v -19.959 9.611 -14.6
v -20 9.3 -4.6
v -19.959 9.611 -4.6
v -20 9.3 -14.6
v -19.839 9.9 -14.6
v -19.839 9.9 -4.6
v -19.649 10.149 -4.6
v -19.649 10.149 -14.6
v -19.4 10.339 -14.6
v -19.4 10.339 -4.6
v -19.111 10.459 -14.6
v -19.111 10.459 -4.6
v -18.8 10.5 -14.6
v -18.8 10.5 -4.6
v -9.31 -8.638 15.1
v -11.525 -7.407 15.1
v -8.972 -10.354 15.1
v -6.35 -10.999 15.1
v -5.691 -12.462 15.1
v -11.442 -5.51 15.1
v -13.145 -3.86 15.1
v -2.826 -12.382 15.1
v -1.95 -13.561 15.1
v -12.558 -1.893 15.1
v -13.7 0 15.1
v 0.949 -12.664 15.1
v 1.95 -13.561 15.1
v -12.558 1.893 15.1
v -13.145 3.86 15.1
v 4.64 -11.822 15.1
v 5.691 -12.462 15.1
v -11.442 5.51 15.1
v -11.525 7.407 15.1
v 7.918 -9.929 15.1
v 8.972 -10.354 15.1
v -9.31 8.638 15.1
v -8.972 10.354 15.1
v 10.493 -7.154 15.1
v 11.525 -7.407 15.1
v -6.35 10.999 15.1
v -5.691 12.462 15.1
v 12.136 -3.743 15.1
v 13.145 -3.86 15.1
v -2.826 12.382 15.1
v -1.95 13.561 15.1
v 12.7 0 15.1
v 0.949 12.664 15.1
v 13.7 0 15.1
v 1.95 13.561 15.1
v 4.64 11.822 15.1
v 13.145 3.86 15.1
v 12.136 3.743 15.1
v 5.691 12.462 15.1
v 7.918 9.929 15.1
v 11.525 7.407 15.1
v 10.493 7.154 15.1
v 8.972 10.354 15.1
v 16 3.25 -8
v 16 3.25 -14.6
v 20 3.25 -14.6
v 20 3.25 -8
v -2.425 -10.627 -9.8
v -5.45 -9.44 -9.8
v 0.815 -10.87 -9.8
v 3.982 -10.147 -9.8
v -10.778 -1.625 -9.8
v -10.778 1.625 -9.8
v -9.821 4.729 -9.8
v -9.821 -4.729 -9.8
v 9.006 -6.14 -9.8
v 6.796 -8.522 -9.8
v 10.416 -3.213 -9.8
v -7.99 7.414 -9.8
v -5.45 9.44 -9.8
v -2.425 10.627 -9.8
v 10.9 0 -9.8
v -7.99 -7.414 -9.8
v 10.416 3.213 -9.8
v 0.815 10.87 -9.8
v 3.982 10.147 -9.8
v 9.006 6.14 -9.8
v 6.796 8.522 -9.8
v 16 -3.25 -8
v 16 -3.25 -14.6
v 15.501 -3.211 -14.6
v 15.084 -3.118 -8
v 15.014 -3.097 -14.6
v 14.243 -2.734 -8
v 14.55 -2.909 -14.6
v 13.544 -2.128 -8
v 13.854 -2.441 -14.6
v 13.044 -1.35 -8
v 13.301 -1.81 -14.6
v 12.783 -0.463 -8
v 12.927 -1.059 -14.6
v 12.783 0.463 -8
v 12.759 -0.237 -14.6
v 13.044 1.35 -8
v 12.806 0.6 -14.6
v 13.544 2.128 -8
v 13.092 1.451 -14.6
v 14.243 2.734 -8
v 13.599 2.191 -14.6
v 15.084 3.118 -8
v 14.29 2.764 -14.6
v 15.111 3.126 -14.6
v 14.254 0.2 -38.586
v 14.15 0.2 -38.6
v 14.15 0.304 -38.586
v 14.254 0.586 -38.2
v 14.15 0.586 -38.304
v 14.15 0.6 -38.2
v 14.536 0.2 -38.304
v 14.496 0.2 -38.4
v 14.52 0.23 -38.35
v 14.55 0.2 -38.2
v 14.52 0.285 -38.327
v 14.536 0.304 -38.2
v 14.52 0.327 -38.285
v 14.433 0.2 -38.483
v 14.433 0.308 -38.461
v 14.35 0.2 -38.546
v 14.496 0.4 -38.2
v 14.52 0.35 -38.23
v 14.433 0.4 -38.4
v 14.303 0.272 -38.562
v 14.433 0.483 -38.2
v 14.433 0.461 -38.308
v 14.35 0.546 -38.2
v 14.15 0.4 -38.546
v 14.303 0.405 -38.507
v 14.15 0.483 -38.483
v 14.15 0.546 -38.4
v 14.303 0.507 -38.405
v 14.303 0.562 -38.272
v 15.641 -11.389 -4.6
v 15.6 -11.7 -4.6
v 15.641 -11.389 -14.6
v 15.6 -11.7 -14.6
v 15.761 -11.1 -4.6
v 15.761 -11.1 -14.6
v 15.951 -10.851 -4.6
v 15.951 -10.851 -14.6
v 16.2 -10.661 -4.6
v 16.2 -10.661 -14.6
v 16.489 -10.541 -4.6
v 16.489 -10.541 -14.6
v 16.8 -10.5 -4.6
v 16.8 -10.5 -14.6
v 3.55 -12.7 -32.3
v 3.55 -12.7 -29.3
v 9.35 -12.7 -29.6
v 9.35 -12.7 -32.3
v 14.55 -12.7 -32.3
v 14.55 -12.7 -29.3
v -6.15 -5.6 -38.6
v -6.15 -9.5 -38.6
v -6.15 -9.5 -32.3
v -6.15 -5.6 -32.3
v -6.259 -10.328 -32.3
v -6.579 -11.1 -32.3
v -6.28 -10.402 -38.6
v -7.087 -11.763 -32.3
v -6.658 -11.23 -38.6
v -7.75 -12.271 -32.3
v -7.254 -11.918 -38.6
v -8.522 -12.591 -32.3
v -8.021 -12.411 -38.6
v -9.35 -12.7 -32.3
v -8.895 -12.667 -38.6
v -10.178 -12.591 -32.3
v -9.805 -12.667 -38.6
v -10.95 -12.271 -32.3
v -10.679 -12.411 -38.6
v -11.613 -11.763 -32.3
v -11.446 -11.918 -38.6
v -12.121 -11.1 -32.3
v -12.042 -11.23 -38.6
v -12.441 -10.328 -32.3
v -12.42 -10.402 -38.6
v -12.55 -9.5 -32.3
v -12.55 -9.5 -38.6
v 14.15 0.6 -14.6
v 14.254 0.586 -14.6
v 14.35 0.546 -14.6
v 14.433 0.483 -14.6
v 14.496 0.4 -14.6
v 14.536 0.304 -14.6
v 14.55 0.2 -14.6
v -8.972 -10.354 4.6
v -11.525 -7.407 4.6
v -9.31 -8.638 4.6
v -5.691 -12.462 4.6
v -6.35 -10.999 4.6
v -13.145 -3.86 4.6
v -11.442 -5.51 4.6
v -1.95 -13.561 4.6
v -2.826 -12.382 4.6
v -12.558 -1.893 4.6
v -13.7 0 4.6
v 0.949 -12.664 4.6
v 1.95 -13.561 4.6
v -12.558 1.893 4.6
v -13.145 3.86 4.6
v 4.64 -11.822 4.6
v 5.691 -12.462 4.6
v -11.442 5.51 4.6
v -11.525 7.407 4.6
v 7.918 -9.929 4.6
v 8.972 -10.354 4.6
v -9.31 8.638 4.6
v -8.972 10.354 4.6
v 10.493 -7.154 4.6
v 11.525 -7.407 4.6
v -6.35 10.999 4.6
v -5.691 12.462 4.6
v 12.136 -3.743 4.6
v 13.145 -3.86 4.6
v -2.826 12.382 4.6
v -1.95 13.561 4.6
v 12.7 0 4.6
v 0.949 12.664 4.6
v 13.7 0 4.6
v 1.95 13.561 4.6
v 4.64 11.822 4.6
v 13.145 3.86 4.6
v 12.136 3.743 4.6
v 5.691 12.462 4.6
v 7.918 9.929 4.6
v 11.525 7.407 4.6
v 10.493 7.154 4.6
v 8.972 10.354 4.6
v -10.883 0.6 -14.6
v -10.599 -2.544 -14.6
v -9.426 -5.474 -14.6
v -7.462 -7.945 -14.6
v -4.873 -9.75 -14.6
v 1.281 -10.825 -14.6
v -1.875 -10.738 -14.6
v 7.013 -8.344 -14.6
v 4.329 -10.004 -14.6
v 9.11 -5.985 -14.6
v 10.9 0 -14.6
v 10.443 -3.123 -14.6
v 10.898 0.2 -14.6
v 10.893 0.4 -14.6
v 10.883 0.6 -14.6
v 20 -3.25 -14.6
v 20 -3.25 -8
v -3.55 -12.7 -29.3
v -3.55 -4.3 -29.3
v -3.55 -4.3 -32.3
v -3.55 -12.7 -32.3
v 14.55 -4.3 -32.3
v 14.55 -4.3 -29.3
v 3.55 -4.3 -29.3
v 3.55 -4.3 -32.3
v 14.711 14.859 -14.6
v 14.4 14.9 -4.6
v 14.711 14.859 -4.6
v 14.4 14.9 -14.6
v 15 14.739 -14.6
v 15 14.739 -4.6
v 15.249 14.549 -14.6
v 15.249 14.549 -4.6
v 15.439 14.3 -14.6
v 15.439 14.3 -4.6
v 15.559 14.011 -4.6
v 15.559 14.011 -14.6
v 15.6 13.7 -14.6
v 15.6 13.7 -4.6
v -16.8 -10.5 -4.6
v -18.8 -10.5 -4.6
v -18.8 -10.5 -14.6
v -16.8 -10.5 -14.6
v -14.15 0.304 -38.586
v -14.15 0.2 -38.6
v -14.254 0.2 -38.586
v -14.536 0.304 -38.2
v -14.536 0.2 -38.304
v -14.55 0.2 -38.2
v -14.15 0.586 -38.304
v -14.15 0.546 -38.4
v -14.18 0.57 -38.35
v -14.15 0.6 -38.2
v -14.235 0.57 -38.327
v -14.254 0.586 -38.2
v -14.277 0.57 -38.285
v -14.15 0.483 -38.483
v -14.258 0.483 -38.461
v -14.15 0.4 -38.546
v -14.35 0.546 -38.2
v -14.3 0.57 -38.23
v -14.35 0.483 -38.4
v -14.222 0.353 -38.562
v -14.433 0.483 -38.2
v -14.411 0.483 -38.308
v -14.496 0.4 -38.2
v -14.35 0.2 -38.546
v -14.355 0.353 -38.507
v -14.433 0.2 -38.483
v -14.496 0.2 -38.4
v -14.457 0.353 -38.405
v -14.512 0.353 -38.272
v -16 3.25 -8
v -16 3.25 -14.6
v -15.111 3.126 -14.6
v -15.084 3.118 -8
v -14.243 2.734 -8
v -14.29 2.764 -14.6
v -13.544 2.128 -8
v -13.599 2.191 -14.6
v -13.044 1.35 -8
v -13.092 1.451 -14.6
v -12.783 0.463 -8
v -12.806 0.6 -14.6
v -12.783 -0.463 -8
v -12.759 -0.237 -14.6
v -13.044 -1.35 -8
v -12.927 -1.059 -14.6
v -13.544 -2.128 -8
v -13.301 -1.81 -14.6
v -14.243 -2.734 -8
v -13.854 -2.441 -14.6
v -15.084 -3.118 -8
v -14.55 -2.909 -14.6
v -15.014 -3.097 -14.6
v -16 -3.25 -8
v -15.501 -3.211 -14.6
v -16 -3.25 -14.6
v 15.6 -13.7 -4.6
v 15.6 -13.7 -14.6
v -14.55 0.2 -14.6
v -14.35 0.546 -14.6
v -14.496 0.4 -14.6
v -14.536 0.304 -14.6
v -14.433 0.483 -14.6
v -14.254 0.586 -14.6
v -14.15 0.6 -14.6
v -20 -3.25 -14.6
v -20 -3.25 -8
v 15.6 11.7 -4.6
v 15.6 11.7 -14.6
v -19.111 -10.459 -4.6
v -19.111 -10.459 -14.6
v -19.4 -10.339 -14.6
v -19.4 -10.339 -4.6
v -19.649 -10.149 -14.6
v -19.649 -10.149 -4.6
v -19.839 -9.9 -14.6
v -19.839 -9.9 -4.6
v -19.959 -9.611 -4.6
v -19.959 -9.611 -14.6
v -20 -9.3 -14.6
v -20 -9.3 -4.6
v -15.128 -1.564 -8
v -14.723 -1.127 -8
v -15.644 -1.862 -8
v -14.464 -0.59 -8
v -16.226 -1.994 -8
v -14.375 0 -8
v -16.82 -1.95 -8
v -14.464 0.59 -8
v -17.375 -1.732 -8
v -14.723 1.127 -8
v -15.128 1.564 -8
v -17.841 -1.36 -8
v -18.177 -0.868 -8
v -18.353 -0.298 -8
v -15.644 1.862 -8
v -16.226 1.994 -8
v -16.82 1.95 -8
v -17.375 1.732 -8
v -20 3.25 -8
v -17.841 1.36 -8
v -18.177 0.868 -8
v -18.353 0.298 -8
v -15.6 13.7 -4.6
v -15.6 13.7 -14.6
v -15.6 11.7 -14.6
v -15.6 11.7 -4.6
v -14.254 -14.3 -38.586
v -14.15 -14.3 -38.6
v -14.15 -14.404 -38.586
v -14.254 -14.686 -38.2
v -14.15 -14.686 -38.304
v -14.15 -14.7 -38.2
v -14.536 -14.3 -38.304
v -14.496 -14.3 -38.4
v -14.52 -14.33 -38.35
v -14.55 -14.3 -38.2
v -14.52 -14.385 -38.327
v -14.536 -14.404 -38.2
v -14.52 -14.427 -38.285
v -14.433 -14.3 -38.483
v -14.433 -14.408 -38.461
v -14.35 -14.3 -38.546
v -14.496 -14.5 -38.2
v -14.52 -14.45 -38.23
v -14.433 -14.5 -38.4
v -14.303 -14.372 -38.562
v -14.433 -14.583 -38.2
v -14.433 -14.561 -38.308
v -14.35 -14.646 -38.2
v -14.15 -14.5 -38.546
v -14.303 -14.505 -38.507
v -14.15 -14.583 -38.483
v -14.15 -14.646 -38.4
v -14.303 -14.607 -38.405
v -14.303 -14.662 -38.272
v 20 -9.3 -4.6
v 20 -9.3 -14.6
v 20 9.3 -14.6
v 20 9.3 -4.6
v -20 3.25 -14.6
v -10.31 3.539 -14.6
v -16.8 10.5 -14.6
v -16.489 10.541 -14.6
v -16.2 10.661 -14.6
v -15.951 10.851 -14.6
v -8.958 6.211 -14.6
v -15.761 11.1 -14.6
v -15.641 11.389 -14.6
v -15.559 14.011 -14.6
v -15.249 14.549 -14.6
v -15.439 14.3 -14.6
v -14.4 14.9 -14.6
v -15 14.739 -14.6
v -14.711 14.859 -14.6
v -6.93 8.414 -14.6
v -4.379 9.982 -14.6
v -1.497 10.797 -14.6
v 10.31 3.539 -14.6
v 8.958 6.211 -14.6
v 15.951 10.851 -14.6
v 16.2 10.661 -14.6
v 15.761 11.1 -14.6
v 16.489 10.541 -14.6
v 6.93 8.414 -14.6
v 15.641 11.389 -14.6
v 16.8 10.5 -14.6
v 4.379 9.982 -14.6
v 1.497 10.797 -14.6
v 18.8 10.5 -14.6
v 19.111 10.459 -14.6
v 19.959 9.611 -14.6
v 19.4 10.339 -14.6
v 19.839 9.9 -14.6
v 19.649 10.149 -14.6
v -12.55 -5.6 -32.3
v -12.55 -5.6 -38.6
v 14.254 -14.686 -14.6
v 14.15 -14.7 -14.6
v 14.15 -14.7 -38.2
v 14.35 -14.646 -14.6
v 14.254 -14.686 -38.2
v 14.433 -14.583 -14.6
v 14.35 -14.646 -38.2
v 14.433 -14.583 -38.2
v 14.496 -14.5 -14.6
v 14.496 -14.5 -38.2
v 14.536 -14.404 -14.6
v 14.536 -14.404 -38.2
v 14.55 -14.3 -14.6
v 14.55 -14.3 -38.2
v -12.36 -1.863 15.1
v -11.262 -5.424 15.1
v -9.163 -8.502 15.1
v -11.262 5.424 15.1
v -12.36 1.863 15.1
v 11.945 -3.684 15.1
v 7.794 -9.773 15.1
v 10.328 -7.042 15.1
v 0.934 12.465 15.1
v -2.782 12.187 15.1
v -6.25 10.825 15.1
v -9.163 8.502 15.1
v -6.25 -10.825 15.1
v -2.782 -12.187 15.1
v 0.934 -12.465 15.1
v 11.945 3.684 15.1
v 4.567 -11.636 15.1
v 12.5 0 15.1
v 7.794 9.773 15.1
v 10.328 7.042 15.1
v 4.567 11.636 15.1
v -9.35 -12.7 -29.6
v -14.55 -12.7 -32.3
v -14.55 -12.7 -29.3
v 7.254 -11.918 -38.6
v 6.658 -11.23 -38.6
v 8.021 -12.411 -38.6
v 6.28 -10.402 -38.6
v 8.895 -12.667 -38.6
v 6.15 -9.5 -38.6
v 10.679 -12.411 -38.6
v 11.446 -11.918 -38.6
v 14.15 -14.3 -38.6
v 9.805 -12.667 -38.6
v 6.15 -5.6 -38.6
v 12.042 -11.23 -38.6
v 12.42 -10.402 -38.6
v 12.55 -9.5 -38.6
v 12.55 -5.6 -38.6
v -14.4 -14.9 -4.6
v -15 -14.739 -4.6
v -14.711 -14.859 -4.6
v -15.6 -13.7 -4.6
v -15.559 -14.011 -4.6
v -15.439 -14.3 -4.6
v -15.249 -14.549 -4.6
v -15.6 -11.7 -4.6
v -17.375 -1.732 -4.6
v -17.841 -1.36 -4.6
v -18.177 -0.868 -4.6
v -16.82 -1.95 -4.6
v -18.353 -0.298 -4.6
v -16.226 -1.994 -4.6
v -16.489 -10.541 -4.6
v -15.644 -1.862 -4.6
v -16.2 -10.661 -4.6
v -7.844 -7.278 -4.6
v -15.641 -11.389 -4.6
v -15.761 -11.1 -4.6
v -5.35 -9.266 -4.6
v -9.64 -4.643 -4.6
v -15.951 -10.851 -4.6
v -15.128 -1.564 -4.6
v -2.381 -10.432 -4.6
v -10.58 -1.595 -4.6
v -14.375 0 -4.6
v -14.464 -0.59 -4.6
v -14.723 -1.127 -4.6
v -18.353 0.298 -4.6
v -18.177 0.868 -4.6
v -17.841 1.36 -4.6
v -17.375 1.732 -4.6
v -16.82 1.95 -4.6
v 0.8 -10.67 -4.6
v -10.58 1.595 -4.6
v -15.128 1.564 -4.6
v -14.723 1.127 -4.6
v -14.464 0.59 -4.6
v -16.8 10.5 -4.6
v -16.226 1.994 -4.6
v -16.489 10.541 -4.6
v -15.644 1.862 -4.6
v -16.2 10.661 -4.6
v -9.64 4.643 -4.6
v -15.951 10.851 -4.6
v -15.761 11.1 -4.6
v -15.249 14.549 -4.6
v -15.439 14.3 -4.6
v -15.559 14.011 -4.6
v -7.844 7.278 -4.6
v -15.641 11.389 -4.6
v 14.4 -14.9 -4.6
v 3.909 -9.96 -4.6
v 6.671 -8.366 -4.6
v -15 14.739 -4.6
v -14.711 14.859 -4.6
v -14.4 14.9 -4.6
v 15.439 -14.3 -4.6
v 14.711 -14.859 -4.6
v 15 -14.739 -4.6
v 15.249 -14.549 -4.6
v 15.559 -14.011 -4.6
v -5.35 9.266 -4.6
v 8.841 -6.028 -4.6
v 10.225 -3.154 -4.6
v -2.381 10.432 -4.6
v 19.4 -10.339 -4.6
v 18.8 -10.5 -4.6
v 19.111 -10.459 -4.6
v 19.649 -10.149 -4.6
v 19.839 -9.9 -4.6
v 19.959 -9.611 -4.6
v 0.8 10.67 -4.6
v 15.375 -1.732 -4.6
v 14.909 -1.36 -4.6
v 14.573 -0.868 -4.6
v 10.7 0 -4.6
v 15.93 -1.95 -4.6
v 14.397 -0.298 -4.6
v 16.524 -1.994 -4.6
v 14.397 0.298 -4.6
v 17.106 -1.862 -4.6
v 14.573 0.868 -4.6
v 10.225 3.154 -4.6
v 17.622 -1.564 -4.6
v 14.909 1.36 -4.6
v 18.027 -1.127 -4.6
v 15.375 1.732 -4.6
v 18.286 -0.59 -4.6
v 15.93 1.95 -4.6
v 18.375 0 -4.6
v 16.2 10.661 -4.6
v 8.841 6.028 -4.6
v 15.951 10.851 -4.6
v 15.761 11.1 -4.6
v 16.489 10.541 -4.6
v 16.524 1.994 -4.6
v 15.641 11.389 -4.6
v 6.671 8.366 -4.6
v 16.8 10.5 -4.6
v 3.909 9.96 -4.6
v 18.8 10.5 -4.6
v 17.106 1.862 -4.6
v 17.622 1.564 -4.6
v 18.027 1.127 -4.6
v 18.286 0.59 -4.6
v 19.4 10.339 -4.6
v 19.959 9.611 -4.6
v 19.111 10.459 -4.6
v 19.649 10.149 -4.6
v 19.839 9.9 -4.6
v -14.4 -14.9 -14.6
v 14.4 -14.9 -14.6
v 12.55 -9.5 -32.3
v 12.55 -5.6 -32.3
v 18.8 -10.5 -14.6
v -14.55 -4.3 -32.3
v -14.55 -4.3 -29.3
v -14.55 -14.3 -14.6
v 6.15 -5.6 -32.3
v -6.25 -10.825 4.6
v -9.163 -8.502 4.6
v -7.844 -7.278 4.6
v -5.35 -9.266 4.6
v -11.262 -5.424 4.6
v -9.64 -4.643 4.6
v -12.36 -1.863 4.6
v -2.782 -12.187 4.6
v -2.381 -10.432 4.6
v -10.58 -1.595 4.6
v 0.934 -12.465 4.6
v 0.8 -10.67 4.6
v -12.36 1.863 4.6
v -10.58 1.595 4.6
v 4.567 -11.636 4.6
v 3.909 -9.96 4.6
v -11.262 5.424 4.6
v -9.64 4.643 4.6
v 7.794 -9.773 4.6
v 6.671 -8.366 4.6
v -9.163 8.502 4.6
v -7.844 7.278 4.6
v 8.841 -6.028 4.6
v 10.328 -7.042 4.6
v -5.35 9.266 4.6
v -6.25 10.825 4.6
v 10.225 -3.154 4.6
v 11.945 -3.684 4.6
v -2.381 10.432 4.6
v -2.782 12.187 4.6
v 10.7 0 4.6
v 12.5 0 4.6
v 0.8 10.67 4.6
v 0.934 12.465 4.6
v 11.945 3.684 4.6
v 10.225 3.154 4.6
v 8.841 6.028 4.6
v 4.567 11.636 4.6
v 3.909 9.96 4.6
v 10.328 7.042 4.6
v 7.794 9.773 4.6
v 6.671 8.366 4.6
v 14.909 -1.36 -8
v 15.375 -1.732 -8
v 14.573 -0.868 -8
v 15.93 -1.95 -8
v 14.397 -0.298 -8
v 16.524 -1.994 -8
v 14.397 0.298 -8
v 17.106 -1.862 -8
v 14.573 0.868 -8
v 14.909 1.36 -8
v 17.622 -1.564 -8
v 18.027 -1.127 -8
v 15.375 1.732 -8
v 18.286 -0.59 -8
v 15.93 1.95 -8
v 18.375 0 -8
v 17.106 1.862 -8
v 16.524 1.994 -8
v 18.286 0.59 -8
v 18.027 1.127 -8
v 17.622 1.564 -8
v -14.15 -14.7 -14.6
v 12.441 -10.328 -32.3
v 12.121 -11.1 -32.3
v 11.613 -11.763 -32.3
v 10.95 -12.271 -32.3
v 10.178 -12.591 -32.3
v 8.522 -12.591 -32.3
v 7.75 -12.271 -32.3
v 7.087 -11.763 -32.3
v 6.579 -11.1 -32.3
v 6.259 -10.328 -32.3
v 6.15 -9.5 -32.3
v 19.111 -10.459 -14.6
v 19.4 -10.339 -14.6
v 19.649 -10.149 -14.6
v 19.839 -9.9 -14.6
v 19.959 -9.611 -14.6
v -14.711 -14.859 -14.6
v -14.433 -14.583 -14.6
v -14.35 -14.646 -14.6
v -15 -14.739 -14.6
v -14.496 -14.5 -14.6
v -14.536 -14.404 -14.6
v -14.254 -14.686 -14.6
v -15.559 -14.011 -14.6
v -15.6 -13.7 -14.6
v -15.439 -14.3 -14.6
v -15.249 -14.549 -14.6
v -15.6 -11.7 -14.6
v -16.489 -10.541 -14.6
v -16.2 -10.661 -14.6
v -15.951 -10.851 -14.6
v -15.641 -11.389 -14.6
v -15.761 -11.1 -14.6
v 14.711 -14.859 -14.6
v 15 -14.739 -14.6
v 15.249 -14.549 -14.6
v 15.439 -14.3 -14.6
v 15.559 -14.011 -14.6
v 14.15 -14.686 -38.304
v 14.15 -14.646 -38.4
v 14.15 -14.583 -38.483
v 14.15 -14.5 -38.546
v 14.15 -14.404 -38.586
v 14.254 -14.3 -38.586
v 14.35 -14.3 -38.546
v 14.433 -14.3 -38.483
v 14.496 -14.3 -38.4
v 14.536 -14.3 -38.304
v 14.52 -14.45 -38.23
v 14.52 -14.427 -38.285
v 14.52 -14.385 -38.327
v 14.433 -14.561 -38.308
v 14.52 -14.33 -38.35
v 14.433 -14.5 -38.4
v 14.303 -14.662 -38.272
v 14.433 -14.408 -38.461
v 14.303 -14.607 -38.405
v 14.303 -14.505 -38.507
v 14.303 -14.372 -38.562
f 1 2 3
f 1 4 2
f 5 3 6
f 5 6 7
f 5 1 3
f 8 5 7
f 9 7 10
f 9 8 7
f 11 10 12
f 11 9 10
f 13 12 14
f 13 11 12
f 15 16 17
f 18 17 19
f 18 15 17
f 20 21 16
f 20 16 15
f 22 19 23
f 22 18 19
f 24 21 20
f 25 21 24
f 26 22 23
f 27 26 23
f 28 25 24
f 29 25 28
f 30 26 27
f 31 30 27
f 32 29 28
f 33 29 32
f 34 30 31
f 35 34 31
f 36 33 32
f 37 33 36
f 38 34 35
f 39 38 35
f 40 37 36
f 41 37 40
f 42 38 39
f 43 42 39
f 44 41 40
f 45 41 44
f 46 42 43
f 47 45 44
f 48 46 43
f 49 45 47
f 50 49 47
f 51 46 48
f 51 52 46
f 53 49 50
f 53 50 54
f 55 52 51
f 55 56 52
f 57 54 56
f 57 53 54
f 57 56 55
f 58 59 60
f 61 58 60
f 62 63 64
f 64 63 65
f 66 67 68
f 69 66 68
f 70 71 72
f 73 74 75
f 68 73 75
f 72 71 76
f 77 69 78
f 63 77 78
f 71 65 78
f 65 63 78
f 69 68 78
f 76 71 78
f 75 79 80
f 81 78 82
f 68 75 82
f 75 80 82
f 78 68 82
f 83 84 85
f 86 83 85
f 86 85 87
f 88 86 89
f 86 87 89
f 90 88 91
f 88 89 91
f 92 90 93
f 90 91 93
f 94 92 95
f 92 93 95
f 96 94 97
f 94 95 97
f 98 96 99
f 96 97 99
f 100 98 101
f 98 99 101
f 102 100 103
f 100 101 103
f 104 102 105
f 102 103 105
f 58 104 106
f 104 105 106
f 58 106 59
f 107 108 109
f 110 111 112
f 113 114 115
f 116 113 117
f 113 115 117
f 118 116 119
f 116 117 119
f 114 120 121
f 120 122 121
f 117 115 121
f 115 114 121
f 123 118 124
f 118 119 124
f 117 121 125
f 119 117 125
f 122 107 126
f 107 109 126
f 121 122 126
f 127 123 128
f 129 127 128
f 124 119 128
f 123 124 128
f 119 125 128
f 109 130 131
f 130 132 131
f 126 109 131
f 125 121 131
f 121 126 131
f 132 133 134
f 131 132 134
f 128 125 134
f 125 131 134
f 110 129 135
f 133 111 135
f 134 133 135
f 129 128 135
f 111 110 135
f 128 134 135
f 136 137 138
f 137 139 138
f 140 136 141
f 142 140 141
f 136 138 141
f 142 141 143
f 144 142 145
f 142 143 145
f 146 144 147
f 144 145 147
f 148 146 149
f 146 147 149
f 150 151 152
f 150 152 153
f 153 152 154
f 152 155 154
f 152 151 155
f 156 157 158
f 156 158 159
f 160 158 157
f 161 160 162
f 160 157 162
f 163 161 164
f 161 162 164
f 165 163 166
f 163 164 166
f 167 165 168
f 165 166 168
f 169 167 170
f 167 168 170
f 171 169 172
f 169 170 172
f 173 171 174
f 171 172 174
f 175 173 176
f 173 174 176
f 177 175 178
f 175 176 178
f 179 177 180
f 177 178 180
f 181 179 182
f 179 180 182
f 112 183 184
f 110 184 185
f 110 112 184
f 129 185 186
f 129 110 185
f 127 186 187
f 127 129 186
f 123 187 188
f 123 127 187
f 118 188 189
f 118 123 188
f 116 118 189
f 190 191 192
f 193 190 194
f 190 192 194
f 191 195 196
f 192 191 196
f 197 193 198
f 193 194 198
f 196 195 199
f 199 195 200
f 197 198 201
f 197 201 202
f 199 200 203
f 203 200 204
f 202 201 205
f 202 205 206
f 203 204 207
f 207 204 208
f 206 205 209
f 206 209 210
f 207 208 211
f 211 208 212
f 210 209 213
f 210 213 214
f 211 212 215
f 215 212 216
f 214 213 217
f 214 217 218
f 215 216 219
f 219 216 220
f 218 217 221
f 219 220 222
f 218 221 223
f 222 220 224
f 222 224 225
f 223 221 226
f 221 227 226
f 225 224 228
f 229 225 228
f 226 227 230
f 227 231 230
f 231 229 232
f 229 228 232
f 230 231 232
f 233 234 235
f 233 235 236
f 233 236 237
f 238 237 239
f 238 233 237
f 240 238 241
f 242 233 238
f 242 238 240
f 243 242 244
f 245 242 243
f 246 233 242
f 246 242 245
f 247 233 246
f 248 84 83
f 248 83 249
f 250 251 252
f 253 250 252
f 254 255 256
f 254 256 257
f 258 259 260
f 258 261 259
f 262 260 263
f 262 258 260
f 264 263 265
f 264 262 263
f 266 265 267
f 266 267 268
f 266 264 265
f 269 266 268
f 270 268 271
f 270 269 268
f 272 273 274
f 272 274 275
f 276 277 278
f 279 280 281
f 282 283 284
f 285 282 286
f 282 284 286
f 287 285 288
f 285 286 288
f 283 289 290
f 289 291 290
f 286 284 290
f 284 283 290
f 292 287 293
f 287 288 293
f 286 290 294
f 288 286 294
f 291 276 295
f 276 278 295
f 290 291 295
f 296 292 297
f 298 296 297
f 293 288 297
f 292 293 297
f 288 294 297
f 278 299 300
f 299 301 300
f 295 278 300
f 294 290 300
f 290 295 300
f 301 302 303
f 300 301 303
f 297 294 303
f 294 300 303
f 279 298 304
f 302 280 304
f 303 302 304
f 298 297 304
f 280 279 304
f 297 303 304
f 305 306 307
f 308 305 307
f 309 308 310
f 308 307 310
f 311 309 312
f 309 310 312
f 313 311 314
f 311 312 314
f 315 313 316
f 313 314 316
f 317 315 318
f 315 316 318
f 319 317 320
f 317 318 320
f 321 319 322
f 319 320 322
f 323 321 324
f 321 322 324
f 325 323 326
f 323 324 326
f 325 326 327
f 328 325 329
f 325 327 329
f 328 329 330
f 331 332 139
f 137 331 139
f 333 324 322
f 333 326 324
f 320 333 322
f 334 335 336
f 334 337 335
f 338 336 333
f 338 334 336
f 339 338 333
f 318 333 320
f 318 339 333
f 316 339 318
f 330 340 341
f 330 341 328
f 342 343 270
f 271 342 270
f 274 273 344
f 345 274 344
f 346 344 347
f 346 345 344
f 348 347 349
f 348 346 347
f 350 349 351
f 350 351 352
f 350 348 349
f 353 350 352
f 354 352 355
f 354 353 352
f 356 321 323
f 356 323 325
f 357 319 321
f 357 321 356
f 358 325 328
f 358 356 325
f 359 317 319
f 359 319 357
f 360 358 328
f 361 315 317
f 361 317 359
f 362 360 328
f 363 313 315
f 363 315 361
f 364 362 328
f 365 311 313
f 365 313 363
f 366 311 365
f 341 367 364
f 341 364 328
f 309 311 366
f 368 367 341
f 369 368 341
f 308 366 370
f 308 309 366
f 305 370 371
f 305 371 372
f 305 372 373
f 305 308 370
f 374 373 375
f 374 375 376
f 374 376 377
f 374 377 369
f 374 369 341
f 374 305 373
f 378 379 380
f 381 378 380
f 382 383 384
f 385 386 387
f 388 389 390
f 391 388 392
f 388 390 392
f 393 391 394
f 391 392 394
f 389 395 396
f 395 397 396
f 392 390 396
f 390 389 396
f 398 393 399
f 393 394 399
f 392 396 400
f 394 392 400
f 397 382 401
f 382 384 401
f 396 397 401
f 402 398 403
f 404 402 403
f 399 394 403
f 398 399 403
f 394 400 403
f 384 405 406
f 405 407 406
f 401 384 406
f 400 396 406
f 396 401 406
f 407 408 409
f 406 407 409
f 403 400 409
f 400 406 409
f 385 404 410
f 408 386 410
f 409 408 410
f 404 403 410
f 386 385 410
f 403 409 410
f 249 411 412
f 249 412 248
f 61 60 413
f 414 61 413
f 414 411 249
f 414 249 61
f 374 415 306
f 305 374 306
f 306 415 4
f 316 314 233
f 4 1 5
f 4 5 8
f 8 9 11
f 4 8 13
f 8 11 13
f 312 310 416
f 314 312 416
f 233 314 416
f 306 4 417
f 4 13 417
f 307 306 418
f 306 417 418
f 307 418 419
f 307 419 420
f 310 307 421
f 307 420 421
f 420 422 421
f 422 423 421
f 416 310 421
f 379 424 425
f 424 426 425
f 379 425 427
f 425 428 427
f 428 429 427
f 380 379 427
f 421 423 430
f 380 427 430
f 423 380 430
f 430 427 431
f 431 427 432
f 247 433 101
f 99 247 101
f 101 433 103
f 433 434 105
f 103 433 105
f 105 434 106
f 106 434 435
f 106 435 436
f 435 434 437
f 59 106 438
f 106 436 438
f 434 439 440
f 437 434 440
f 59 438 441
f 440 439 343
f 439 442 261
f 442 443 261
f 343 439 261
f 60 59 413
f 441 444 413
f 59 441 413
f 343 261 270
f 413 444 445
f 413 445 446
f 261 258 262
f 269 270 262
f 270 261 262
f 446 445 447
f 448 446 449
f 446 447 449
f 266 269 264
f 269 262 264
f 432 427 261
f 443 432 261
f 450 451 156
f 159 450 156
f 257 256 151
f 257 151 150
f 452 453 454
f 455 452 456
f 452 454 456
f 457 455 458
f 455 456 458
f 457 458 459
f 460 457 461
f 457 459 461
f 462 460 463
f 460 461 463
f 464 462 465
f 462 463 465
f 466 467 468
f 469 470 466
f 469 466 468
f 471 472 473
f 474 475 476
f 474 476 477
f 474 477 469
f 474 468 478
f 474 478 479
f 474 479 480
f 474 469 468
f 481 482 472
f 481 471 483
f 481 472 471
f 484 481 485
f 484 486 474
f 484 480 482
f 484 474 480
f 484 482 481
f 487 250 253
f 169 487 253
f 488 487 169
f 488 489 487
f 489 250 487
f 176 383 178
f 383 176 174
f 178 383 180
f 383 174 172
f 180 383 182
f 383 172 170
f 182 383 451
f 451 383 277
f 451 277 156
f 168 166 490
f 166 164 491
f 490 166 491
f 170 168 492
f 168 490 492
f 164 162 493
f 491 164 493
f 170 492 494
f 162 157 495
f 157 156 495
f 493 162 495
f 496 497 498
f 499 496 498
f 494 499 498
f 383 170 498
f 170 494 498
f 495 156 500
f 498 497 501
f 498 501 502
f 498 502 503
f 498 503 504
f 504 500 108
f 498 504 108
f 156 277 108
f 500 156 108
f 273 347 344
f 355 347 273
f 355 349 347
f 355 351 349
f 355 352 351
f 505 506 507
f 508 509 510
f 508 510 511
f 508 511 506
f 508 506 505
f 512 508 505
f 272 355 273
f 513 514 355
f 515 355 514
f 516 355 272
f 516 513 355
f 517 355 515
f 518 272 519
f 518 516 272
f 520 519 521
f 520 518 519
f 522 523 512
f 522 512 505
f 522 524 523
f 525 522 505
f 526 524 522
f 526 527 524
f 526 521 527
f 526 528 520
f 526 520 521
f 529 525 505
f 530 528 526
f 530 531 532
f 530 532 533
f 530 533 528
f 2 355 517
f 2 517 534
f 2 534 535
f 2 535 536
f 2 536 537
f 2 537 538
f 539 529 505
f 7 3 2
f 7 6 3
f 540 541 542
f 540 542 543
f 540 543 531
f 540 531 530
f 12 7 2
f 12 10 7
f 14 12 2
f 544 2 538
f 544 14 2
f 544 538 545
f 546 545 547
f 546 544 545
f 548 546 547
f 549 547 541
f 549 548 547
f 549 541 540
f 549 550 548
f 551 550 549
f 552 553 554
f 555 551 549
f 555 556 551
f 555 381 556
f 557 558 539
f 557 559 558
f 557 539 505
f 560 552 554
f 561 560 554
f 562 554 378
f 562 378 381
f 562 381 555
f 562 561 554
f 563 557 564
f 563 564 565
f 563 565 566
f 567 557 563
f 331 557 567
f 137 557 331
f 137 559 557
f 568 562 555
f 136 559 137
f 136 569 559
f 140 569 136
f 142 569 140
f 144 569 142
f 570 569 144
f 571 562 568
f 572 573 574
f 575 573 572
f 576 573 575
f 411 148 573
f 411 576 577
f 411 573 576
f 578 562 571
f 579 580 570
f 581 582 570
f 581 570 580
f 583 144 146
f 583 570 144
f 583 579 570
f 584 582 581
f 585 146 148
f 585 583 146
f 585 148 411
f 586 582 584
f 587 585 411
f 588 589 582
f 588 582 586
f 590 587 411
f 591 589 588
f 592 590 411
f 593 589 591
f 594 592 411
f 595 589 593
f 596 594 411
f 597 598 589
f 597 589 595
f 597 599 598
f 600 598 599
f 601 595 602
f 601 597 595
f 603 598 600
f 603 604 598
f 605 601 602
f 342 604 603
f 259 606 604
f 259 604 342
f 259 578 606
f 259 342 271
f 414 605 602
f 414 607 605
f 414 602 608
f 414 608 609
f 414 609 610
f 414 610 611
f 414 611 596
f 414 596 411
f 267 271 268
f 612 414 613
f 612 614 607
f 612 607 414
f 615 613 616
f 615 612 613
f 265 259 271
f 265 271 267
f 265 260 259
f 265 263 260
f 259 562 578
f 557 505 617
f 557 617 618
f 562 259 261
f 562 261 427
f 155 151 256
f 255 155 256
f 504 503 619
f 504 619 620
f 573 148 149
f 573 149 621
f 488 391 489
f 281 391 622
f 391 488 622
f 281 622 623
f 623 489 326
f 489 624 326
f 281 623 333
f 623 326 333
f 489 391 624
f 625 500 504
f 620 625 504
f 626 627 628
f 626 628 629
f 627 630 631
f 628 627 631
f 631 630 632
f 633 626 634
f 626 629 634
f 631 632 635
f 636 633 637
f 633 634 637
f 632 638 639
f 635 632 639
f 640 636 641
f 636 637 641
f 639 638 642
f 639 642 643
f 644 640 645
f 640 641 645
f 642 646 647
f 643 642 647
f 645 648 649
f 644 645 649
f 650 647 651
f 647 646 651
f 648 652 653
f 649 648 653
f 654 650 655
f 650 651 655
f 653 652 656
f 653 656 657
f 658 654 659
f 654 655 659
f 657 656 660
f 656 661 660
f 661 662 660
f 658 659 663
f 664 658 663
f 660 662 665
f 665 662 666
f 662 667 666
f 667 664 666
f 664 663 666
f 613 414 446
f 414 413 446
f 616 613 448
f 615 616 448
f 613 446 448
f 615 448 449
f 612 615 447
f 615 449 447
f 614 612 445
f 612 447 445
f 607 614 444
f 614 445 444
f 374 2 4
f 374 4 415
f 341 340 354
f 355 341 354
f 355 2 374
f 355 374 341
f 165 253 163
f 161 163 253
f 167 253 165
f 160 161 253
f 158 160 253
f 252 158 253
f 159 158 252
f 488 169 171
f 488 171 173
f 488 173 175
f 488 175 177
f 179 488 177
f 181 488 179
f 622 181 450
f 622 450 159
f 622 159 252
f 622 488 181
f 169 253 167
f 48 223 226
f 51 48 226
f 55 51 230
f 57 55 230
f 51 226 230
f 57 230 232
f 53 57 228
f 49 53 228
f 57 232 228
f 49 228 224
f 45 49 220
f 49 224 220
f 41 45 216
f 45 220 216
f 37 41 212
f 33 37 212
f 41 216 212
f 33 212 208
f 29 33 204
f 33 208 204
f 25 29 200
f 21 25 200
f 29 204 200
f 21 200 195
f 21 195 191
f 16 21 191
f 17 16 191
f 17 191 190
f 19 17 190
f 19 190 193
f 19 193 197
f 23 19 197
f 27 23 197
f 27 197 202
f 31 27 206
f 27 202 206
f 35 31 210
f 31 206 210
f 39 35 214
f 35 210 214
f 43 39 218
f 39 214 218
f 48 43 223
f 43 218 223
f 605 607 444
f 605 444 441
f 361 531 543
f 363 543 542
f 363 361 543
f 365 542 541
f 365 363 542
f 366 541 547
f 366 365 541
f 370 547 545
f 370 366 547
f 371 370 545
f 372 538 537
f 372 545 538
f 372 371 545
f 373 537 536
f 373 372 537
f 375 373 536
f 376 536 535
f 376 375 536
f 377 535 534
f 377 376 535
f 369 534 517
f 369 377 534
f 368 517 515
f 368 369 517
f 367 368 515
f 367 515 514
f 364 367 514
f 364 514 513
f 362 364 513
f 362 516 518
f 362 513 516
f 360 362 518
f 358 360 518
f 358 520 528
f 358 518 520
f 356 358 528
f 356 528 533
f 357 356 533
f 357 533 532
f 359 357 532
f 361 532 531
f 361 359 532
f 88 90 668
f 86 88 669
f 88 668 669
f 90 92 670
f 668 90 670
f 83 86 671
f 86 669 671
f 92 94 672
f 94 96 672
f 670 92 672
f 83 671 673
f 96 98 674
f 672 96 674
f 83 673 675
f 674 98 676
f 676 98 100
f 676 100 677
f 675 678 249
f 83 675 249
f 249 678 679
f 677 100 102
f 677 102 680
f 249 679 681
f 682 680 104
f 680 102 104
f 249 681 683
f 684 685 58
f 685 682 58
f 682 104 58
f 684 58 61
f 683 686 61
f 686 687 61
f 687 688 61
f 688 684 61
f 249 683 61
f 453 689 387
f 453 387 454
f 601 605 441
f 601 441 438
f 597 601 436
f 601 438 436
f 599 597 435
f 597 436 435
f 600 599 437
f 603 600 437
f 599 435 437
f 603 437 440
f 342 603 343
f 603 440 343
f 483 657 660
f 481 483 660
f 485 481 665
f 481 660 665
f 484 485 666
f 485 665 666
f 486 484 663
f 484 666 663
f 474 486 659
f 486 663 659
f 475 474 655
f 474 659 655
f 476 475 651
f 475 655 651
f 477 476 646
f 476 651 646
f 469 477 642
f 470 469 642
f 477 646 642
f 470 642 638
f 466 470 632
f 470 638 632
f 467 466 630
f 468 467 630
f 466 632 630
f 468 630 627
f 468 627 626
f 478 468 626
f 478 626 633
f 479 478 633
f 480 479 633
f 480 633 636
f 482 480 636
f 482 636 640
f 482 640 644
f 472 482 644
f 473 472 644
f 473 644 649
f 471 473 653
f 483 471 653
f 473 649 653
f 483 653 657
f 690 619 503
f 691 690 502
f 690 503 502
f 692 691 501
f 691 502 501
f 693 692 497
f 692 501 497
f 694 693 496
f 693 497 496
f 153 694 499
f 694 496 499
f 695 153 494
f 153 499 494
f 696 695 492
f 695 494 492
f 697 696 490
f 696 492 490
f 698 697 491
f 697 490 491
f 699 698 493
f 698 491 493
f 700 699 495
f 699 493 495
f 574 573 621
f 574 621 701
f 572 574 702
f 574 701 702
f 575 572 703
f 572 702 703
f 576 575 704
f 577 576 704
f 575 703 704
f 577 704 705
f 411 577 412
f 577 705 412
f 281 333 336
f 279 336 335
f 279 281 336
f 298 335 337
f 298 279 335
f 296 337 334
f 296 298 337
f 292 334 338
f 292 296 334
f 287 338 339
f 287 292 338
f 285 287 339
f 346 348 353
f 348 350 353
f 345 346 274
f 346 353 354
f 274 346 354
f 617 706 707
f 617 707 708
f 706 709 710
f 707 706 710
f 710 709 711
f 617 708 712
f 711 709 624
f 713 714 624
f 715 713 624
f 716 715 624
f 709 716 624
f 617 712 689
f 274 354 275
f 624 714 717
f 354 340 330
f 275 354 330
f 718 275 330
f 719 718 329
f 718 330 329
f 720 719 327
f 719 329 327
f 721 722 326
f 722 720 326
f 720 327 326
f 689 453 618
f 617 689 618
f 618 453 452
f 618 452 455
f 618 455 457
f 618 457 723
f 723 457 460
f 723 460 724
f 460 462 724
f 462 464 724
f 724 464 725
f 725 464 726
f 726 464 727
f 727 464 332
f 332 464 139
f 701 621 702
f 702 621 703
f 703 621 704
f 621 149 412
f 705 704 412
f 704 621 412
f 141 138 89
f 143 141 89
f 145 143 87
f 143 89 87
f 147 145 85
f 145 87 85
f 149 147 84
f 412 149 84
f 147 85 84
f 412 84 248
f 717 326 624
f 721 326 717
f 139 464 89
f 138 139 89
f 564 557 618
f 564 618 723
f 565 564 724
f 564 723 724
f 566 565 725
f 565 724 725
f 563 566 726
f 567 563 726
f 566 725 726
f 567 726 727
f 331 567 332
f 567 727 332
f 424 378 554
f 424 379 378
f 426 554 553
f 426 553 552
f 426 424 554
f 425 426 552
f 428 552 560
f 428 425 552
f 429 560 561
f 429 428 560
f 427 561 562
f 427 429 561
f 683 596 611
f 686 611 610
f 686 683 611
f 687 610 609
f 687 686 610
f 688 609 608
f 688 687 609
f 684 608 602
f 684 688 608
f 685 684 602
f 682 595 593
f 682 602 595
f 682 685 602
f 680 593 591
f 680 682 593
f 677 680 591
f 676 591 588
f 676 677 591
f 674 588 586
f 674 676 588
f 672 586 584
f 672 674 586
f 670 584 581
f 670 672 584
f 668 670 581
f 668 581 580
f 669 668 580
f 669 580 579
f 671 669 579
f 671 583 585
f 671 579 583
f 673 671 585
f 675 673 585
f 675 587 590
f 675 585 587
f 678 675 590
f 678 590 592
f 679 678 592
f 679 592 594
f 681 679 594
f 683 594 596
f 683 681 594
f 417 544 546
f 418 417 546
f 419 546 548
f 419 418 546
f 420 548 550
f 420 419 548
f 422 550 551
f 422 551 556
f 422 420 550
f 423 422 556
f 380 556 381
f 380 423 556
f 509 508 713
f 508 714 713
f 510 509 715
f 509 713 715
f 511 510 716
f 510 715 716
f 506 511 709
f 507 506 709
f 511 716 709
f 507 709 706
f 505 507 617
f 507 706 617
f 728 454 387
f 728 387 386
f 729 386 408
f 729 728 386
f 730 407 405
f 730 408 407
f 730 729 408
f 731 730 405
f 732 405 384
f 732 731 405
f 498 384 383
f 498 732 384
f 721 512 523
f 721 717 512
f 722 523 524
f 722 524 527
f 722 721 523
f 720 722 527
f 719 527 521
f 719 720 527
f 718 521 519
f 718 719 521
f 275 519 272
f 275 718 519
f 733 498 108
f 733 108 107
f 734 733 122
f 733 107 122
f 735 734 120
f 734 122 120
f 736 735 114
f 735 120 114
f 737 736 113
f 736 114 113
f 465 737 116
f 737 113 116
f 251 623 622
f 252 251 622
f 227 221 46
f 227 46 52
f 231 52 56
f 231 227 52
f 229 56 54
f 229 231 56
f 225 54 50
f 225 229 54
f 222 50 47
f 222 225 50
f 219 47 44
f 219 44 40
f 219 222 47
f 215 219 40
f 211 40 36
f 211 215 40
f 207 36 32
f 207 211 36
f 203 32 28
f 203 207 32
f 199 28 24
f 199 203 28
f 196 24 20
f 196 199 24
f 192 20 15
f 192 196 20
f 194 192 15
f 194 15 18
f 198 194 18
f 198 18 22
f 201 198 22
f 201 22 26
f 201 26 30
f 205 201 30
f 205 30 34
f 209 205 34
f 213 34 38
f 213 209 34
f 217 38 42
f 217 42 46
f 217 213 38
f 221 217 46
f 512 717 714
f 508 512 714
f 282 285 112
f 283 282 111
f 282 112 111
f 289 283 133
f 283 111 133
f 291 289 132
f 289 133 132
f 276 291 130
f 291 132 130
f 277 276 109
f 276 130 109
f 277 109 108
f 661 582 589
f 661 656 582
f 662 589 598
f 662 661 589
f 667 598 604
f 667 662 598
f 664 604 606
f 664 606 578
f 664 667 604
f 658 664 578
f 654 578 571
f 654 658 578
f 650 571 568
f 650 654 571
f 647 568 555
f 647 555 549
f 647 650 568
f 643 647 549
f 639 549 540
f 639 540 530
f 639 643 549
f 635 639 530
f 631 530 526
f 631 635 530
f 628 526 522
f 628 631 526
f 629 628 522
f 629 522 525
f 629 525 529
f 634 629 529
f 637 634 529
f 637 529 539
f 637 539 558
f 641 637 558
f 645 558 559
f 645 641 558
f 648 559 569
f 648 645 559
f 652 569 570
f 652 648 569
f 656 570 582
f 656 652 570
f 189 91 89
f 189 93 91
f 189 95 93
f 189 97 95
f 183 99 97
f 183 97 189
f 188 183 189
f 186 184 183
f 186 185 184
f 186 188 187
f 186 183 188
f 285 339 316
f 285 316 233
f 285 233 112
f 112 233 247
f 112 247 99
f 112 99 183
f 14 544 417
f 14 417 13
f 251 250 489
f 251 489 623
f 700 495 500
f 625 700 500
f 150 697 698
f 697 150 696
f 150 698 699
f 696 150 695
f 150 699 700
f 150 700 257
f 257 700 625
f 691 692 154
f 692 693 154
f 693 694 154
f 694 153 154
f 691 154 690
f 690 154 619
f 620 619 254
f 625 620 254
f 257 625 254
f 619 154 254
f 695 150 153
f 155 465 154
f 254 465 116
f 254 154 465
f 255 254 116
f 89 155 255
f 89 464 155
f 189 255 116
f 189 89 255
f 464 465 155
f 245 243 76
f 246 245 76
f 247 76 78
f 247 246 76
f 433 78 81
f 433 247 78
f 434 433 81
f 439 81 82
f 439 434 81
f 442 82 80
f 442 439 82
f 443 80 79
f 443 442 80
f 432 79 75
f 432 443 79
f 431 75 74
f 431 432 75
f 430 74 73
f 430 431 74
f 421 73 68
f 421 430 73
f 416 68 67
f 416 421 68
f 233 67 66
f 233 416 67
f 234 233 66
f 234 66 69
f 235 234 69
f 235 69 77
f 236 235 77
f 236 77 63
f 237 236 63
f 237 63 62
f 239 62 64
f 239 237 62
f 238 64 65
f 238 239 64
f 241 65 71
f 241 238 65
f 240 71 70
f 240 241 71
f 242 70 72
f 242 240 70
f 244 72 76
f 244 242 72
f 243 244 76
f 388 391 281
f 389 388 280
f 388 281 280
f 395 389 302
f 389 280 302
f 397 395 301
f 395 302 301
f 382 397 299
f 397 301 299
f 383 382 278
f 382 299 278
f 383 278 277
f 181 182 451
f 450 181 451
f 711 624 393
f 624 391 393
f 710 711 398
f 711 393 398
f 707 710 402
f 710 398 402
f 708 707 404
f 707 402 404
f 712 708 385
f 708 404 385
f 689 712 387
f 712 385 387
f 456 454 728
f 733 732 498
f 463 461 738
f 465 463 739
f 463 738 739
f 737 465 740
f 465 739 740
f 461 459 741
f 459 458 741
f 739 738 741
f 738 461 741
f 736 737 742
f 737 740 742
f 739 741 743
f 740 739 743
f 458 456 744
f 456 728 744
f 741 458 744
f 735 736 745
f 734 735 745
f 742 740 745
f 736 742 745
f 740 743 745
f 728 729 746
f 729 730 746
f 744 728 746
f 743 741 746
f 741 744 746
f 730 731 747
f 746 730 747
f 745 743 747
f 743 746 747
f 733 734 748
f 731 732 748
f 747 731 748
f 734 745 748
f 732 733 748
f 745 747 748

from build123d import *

# Parameters (mm, degrees)
SKETCH1_R           = 10.7
BOSS_EXTRUDE1_DEPTH = 4.6
BOSS_EXTRUDE2_START = 4.6
SKETCH2_R           = 13.7
SKETCH2_R_2         = 12.7
BOSS_EXTRUDE2_DEPTH = 10.5
BOSS_EXTRUDE3_START = 4.6
SKETCH3_R           = 12.5
BOSS_EXTRUDE3_DEPTH = 10.5
BOSS_EXTRUDE4_START = -4.6
BOSS_EXTRUDE4_DEPTH = 10
FILLET1_R           = 1.2
CUT_EXTRUDE1_START  = -14.6
SKETCH5_W           = 4
SKETCH5_H           = 6.5
CUT_EXTRUDE1_DEPTH  = 6.6
CUT_EXTRUDE2_START  = -8
SKETCH6_R           = 2
CUT_EXTRUDE2_DEPTH  = 12.6
BOSS_EXTRUDE5_START = -14.6
SKETCH7_W           = 29.1
SKETCH7_H           = 15.3
BOSS_EXTRUDE5_DEPTH = 24
FILLET2_R           = 0.4
CUT_EXTRUDE3_START  = -14.6
SKETCH8_R           = 10.9
CUT_EXTRUDE3_DEPTH  = 4.8
CUT_EXTRUDE4_START  = -38.6
SKETCH9_W           = 6.4
SKETCH9_H           = 3.9
CUT_EXTRUDE4_DEPTH  = 9
CUT_EXTRUDE5_START  = -14.55
SKETCH10_W          = 3
SKETCH10_H          = 8.4
CUT_EXTRUDE5_DEPTH  = 11
CUT_EXTRUDE6_START  = 14.55
SKETCH11_W          = 3
SKETCH11_H          = 8.4
CUT_EXTRUDE6_DEPTH  = 11


with BuildPart() as part:
    # Sketch1 → Boss-Extrude1 (new body, symmetric)
    with BuildSketch(Plane.XY):
        Circle(SKETCH1_R)
    extrude(amount=BOSS_EXTRUDE1_DEPTH, both=True)

    # Sketch3 → Boss-Extrude3 (add)
    with BuildSketch(Plane.XY.offset(BOSS_EXTRUDE3_START)):
        Circle(SKETCH3_R)
    extrude(amount=BOSS_EXTRUDE3_DEPTH)

    # Sketch4 → Boss-Extrude4 (add)
    with BuildSketch(Plane.XY.offset(BOSS_EXTRUDE4_START)):
        Polygon((-15.6, -10.5), (-15.6, -14.9), (15.6, -14.9), (15.6, -10.5), (20, -10.5), (20, 10.5), (15.6, 10.5), (15.6, 14.9), (-15.6, 14.9), (-15.6, 10.5), (-20, 10.5), (-20, -10.5), align=None)
    extrude(amount=-BOSS_EXTRUDE4_DEPTH)

    # Fillet1
    fillet1_edges = [part.edges().sort_by_distance(p)[0] for p in [
        (15.6, 10.5, -9.6),
        (20, 10.5, -9.6),
        (20, -10.5, -9.6),
        (15.6, -10.5, -9.6),
        (15.6, -14.9, -9.6),
        (-15.6, -14.9, -9.6),
        (-15.6, -10.5, -9.6),
        (-20, -10.5, -9.6),
        (-20, 10.5, -9.6),
        (-15.6, 10.5, -9.6),
        (-15.6, 14.9, -9.6),
        (15.6, 14.9, -9.6),
    ]]
    fillet(fillet1_edges, radius=FILLET1_R)

    # Sketch5 → Cut-Extrude1 (cut)
    with BuildSketch(Plane.XY.offset(CUT_EXTRUDE1_START)):
        with Locations((18, 0)):
            Rectangle(SKETCH5_W, SKETCH5_H)
        with BuildLine():
            Line((16, 3.25), (16, -3.25))
            ThreePointArc((16, -3.25), (12.75, 0), (16, 3.25))
        make_face()
        with BuildLine():
            ThreePointArc((-16, 3.25), (-12.75, 0), (-16, -3.25))
            Line((-16, -3.25), (-16, 3.25))
        make_face()
        with Locations((-18, 0)):
            Rectangle(SKETCH5_W, SKETCH5_H)
    extrude(amount=CUT_EXTRUDE1_DEPTH, mode=Mode.SUBTRACT)

    # Sketch6 → Cut-Extrude2 (cut)
    with BuildSketch(Plane.XY.offset(CUT_EXTRUDE2_START)):
        with Locations((16.375, 0)):
            Circle(SKETCH6_R)
        with Locations((-16.375, 0)):
            Circle(SKETCH6_R)
    extrude(amount=CUT_EXTRUDE2_DEPTH, mode=Mode.SUBTRACT)

    # Sketch7 → Boss-Extrude5 (add)
    with BuildSketch(Plane.XY.offset(BOSS_EXTRUDE5_START)):
        with Locations((0, -7.05)):
            Rectangle(SKETCH7_W, SKETCH7_H)
    extrude(amount=-BOSS_EXTRUDE5_DEPTH)

    # Fillet2
    fillet2_edges = [part.edges().sort_by_distance(p)[0] for p in [
        (0, -14.7, -38.6),
        (14.55, -14.7, -26.6),
        (-14.55, -7.05, -38.6),
        (-14.55, -14.7, -26.6),
        (0, 0.6, -38.6),
        (-14.55, 0.6, -26.6),
        (14.55, -7.05, -38.6),
        (14.55, 0.6, -26.6),
    ]]
    fillet(fillet2_edges, radius=FILLET2_R)

    # Sketch8 → Cut-Extrude3 (cut)
    with BuildSketch(Plane.XY.offset(CUT_EXTRUDE3_START)):
        Circle(SKETCH8_R)
    extrude(amount=CUT_EXTRUDE3_DEPTH, mode=Mode.SUBTRACT)

    # Sketch9 → Cut-Extrude4 (cut)
    with BuildSketch(Plane.XY.offset(CUT_EXTRUDE4_START)):
        with Locations((9.35, -7.55)):
            Rectangle(SKETCH9_W, SKETCH9_H)
        with BuildLine():
            ThreePointArc((12.55, -9.5), (9.35, -12.7), (6.15, -9.5))
            Line((6.15, -9.5), (12.55, -9.5))
        make_face()
        with Locations((-9.35, -7.55)):
            Rectangle(SKETCH9_W, SKETCH9_H)
        with BuildLine():
            ThreePointArc((-6.15, -9.5), (-9.35, -12.7), (-12.55, -9.5))
            Line((-12.55, -9.5), (-6.15, -9.5))
        make_face()
    extrude(amount=CUT_EXTRUDE4_DEPTH, mode=Mode.SUBTRACT)

    # Sketch10 → Cut-Extrude5 (cut)
    with BuildSketch(Plane(origin=(0, 0, 0), x_dir=(0, 0, -1), z_dir=(1, 0, 0)).offset(CUT_EXTRUDE5_START)):
        with Locations((30.8, -8.5)):
            Rectangle(SKETCH10_W, SKETCH10_H)
    extrude(amount=CUT_EXTRUDE5_DEPTH, mode=Mode.SUBTRACT)

    # Sketch11 → Cut-Extrude6 (cut)
    with BuildSketch(Plane(origin=(0, 0, 0), x_dir=(0, 0, -1), z_dir=(1, 0, 0)).offset(CUT_EXTRUDE6_START)):
        with Locations((30.8, -8.5)):
            Rectangle(SKETCH11_W, SKETCH11_H)
    extrude(amount=-CUT_EXTRUDE6_DEPTH, mode=Mode.SUBTRACT)


with BuildPart() as body_2:
    # Sketch2 → Boss-Extrude2 (new body)
    with BuildSketch(Plane.XY.offset(BOSS_EXTRUDE2_START)):
        Circle(SKETCH2_R)
        Circle(SKETCH2_R_2, mode=Mode.SUBTRACT)
    extrude(amount=BOSS_EXTRUDE2_DEPTH)


solid = Compound([part.part, body_2.part])
